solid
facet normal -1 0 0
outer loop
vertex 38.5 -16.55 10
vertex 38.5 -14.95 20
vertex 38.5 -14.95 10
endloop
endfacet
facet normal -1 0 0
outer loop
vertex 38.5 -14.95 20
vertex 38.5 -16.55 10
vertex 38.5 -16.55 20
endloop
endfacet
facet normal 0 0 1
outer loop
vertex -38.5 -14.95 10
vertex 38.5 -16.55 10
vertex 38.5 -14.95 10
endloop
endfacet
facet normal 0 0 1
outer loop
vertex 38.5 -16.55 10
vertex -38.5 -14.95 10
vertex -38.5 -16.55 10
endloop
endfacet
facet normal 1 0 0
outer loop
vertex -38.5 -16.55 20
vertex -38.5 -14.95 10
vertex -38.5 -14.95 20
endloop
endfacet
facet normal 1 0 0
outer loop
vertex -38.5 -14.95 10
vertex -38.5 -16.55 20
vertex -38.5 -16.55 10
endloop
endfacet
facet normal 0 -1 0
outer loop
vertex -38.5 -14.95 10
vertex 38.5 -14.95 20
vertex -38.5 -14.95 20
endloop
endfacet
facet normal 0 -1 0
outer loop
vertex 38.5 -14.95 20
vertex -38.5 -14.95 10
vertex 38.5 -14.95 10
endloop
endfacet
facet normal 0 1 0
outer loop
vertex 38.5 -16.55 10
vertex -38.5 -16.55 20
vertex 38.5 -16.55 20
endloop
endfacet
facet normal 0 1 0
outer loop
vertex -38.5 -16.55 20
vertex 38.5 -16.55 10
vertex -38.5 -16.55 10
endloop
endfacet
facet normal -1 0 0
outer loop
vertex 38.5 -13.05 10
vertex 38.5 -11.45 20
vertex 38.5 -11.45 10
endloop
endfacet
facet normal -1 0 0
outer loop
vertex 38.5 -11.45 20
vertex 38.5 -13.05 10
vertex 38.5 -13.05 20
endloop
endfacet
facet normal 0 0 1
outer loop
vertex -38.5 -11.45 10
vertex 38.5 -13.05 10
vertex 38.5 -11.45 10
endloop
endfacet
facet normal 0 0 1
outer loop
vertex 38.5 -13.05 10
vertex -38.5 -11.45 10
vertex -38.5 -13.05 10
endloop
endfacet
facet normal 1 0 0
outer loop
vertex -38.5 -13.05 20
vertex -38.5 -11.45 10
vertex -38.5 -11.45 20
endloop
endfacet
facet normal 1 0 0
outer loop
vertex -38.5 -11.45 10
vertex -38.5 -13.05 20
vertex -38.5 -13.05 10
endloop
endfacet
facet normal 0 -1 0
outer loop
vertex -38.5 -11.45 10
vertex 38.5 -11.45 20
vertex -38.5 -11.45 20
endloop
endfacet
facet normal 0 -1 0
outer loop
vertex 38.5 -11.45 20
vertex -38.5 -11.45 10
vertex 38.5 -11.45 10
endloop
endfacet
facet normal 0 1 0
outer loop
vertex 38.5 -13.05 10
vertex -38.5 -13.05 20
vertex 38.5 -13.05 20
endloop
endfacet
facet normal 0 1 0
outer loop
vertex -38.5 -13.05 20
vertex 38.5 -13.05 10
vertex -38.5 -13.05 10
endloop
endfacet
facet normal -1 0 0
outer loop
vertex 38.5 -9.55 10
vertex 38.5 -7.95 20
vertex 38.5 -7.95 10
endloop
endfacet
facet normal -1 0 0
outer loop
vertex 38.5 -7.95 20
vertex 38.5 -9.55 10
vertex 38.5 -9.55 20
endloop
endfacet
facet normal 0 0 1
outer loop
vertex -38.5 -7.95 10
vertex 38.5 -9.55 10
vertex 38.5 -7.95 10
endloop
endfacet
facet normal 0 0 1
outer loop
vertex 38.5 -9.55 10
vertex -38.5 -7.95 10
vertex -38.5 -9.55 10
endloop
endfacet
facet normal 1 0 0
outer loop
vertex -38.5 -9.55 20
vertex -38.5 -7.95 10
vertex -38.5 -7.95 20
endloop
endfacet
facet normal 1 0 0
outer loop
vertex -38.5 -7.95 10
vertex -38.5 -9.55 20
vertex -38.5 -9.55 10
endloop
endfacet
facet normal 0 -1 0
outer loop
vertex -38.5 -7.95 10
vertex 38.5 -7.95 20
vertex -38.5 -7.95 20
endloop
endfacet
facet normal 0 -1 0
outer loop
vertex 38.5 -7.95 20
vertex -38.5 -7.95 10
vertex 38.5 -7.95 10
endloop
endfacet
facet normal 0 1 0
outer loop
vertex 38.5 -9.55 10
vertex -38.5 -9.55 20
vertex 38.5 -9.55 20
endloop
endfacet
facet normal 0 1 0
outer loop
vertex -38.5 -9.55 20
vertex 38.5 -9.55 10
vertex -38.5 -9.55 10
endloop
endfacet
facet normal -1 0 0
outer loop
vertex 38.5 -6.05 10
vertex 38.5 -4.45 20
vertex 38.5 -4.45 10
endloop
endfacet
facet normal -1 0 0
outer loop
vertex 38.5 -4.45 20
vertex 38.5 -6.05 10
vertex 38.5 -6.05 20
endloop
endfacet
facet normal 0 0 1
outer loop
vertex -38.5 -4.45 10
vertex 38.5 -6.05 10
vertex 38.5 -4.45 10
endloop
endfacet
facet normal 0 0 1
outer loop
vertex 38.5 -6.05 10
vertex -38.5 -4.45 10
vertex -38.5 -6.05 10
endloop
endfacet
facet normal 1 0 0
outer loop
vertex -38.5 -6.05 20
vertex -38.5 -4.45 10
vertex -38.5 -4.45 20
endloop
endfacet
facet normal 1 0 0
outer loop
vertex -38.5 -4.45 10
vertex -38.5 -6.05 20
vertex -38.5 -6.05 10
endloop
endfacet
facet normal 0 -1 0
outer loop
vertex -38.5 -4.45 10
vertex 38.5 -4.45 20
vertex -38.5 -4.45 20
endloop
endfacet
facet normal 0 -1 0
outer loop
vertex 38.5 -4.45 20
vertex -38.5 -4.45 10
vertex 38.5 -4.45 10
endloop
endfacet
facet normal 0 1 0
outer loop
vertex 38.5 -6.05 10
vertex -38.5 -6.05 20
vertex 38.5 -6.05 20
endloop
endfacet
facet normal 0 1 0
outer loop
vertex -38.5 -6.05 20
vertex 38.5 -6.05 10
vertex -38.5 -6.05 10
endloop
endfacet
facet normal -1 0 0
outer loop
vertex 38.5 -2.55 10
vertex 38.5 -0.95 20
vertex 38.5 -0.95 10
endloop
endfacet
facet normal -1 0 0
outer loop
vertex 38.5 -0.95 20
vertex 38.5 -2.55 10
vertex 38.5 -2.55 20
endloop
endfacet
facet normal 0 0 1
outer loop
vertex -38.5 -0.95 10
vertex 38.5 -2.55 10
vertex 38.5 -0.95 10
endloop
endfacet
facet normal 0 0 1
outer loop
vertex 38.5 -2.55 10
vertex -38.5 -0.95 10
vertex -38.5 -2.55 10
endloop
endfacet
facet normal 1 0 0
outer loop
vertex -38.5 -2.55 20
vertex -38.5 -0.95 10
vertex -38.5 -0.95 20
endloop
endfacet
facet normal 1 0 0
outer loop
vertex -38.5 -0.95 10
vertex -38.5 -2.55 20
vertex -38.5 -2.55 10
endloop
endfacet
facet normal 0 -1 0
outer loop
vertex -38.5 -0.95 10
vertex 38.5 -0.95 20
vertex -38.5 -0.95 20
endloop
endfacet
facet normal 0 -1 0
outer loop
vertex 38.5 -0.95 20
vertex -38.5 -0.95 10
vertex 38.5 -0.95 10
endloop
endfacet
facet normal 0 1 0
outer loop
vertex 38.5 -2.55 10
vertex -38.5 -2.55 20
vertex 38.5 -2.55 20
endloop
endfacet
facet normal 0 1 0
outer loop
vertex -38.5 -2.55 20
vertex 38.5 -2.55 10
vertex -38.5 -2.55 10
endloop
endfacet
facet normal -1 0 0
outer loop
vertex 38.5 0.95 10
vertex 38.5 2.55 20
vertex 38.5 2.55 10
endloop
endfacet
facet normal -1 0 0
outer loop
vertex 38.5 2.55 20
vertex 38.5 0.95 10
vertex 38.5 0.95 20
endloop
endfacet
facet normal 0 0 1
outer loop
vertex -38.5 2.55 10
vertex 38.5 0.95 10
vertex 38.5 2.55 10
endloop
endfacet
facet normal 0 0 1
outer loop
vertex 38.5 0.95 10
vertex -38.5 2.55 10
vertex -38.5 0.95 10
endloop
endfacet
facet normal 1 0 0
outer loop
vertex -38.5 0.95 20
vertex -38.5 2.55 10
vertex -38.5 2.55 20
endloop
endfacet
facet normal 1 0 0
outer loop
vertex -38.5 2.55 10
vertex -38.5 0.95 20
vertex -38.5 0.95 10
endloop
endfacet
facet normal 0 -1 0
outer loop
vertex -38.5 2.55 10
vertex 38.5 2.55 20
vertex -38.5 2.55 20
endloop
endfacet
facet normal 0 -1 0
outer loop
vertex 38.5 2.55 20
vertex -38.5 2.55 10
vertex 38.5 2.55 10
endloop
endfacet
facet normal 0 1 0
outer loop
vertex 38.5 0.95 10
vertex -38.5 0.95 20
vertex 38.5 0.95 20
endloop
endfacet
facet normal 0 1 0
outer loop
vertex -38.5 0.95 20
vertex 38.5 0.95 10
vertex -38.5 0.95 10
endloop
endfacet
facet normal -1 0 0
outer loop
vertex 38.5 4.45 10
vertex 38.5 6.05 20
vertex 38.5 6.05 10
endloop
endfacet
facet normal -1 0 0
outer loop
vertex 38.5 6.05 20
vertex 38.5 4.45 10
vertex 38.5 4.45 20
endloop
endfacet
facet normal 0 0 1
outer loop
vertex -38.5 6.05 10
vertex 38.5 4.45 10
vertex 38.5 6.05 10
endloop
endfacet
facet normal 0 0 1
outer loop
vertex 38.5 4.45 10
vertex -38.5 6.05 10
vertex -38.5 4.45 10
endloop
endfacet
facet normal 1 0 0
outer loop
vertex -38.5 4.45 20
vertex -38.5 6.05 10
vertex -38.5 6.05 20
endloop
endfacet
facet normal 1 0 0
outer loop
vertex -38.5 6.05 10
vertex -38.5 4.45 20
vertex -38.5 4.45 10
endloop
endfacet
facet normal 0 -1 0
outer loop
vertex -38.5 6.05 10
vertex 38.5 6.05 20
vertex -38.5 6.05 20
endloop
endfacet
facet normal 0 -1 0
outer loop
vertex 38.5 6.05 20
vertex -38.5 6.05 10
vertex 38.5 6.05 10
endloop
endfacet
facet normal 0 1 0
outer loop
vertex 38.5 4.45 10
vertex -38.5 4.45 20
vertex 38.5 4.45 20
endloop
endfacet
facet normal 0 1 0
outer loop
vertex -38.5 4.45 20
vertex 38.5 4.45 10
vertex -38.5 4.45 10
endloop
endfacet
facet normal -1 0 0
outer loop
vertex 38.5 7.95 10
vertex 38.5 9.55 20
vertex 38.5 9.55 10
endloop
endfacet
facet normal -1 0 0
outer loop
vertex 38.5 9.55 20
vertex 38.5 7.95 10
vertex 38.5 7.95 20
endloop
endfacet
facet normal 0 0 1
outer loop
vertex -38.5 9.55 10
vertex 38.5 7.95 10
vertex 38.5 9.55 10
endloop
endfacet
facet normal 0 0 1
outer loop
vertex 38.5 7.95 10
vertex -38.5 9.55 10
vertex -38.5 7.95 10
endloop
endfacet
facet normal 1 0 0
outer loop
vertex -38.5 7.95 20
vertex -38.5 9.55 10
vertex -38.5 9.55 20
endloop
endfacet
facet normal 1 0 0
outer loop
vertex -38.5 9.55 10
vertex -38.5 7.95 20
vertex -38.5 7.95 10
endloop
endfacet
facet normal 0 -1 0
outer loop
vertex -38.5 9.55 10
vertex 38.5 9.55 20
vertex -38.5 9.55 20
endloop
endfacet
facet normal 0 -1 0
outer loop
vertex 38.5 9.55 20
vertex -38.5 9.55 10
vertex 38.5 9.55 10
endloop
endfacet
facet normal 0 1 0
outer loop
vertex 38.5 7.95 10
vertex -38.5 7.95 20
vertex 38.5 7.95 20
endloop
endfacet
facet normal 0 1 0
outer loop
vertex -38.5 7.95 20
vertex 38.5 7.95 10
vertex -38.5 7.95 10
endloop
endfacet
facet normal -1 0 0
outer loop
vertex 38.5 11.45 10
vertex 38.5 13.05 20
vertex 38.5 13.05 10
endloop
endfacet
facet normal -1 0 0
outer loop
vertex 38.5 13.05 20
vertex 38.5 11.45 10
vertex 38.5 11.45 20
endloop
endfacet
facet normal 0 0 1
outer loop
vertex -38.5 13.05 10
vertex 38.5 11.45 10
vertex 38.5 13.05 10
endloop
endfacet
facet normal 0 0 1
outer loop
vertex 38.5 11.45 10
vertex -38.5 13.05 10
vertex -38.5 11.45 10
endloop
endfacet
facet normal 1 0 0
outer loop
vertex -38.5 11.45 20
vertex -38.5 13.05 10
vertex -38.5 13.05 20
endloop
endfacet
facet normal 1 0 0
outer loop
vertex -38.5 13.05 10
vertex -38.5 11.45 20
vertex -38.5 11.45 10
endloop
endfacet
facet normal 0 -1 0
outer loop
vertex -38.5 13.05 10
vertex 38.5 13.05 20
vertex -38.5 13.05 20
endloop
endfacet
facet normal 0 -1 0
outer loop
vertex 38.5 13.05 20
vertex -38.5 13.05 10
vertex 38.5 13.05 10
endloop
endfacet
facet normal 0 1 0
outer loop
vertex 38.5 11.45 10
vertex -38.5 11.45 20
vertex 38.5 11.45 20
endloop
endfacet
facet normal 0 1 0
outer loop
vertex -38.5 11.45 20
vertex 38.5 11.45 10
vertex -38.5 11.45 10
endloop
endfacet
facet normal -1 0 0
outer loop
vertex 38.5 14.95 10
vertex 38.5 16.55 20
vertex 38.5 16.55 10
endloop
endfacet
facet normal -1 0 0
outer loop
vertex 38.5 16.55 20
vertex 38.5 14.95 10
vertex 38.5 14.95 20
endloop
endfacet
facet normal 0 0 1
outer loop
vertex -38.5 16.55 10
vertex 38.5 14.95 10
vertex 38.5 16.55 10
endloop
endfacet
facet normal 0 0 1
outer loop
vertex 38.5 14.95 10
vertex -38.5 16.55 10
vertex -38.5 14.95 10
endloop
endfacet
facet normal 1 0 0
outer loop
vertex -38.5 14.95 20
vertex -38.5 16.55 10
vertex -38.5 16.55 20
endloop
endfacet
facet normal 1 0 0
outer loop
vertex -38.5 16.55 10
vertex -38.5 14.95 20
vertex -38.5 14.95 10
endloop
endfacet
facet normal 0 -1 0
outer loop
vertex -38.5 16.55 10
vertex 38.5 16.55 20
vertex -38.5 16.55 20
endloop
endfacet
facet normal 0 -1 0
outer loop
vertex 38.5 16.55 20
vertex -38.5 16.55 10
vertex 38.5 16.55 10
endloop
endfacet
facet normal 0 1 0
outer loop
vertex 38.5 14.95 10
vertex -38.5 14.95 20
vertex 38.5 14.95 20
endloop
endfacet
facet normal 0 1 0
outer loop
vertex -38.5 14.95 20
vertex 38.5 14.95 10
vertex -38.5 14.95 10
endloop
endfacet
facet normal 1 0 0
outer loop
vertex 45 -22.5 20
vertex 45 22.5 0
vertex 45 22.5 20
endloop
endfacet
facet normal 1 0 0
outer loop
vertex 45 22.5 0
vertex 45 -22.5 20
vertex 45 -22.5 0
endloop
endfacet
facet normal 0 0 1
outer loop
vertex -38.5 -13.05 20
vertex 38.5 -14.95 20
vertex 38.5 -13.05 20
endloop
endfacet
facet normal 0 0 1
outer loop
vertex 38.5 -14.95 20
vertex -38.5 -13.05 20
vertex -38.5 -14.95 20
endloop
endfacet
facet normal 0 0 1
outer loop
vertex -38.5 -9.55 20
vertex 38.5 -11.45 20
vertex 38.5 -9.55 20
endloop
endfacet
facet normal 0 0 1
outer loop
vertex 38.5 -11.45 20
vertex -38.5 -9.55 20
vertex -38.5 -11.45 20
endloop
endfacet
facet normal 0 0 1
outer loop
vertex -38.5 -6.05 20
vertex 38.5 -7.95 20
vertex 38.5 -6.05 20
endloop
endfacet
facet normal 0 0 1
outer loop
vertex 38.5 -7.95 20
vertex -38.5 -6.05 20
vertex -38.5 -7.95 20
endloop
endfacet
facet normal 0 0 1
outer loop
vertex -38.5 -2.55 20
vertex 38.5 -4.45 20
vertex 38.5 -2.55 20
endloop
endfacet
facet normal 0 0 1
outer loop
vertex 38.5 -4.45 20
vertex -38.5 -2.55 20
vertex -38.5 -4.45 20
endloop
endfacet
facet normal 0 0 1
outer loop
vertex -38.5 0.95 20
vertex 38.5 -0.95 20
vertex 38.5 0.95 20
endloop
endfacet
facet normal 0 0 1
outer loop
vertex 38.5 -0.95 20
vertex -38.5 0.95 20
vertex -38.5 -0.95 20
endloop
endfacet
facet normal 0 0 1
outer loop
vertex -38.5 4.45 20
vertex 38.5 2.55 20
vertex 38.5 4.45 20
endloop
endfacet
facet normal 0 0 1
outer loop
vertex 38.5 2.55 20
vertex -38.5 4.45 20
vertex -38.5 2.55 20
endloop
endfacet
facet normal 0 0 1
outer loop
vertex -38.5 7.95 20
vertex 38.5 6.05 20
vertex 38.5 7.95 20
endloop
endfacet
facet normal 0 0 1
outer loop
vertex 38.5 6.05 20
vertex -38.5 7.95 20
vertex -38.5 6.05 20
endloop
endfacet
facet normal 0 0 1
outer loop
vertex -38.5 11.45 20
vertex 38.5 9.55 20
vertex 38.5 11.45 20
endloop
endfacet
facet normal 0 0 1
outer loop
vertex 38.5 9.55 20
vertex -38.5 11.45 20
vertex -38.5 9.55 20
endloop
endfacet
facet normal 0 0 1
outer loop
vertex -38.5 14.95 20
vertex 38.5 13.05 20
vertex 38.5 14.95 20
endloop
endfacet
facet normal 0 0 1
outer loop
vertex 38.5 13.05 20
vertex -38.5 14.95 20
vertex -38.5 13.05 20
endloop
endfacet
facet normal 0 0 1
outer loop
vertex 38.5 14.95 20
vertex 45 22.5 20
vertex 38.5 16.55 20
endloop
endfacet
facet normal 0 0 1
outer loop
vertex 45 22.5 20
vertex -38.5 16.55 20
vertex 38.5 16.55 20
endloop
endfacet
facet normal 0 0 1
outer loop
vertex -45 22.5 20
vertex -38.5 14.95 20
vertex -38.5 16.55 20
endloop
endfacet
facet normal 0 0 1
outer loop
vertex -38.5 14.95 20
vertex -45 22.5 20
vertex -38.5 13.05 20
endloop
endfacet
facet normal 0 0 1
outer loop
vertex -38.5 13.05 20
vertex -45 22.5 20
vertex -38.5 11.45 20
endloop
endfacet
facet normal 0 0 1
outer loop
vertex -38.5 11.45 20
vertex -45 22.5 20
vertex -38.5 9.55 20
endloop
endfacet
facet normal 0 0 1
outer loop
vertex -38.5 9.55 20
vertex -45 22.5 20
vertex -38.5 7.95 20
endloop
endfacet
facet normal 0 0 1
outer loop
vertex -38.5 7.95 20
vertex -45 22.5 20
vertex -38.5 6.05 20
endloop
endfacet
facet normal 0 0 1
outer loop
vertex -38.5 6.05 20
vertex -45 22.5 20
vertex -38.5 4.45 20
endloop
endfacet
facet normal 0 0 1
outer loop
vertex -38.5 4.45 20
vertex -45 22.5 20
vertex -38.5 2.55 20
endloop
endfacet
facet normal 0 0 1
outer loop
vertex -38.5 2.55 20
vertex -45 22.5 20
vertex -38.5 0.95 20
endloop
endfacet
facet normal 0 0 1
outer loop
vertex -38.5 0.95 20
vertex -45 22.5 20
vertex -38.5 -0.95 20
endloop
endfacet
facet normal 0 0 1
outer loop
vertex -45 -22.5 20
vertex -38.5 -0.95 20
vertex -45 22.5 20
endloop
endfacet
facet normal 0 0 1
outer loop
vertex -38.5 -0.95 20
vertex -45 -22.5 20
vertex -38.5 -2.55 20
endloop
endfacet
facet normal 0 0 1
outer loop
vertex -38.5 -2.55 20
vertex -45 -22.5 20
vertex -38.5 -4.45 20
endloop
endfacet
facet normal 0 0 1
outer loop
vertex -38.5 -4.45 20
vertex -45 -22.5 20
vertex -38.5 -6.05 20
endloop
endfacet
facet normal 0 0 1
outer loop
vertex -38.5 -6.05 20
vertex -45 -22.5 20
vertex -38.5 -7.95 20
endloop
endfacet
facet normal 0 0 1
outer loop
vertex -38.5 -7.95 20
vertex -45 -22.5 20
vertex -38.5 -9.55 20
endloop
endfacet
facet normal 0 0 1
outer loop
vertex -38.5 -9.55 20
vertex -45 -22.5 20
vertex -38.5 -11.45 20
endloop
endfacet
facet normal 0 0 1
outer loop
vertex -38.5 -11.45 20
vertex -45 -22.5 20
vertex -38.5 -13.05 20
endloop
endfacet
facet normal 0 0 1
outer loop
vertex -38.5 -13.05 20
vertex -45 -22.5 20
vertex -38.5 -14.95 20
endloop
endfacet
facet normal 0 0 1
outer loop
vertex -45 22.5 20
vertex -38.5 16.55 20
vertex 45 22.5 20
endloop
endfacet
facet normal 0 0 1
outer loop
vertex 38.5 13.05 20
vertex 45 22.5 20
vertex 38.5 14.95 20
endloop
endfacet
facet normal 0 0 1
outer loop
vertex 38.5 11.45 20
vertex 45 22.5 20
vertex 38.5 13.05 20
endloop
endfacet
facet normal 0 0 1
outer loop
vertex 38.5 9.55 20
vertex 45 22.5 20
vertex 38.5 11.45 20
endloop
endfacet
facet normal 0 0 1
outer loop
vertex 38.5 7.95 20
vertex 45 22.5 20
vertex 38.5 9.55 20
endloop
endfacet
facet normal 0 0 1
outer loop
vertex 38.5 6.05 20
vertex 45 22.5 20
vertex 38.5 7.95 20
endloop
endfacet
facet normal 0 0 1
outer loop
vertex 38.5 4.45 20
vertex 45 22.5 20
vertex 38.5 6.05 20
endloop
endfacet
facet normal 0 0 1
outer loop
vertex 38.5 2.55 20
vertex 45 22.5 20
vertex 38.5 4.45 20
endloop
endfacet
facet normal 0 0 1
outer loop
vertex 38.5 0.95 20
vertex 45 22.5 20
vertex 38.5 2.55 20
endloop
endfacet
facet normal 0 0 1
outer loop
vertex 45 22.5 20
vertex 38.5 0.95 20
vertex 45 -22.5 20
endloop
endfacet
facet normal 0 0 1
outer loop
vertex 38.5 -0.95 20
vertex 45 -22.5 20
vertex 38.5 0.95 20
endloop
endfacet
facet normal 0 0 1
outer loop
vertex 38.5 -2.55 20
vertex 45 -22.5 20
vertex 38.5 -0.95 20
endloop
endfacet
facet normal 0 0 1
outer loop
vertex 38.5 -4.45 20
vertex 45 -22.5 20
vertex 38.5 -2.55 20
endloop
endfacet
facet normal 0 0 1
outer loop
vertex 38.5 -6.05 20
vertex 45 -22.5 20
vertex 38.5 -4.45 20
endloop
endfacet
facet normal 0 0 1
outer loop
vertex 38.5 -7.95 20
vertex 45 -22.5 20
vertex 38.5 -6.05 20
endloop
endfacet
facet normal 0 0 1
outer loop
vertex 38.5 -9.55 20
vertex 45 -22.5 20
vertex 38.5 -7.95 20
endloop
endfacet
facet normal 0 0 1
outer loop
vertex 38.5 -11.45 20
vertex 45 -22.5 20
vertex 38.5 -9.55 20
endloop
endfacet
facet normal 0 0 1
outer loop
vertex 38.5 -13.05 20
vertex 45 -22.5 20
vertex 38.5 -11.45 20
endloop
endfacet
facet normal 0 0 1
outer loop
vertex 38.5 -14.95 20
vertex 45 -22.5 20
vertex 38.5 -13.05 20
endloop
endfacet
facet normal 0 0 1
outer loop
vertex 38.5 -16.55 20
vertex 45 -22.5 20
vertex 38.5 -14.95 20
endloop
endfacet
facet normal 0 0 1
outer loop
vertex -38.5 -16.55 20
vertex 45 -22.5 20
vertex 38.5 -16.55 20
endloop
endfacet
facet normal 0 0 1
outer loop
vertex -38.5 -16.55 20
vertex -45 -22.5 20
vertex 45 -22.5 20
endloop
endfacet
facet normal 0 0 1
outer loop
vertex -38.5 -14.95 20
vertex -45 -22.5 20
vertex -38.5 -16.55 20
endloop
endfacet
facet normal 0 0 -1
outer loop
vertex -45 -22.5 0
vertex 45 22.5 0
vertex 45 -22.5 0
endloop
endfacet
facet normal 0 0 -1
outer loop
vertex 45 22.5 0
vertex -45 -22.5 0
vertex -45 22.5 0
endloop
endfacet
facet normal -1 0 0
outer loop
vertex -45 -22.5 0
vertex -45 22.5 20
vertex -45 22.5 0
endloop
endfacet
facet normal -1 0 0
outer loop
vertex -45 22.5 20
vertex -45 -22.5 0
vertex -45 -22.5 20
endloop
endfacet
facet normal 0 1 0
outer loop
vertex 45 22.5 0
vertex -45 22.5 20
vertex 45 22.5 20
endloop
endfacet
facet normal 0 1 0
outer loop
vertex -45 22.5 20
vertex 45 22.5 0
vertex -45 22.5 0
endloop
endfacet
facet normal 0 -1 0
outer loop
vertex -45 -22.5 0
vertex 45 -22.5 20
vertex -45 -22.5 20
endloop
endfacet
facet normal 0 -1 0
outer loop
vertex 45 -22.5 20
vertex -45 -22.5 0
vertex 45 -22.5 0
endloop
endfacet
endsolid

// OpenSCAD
// Microscope slide drying rack
// Print orientation: base block on XY plane, slots open upward (+Z)

// ---------------- Parameters ----------------
block_len    = 90;    // base block length along X (mm)
block_wid    = 45;    // base block width along Y (mm)
block_h      = 20;    // base block height along Z (mm)

slot_count   = 10;    // number of slide slots
slot_len     = 77;    // slot length along X (mm)
slot_w       = 1.6;   // slot width along Y (mm)
slot_depth   = 10;    // slot depth into block from top face (mm)
slot_pitch   = 3.5;   // centre-to-centre slot spacing along Y (mm)

eps          = 0.5;   // cutter overshoot past top face (mm)

$fn = 64;

// ---------------- Model ----------------
difference() {
    // Base block, centred in X/Y, resting on z = 0
    translate([-block_len/2, -block_wid/2, 0])
        cube([block_len, block_wid, block_h]);

    // Parallel slots running along X, centred in X and Y
    for (i = [0 : slot_count - 1]) {
        y = (i - (slot_count - 1)/2) * slot_pitch;
        translate([-slot_len/2, -slot_w/2 + y, block_h - slot_depth])
            cube([slot_len, slot_w, slot_depth + eps]);
    }
}
